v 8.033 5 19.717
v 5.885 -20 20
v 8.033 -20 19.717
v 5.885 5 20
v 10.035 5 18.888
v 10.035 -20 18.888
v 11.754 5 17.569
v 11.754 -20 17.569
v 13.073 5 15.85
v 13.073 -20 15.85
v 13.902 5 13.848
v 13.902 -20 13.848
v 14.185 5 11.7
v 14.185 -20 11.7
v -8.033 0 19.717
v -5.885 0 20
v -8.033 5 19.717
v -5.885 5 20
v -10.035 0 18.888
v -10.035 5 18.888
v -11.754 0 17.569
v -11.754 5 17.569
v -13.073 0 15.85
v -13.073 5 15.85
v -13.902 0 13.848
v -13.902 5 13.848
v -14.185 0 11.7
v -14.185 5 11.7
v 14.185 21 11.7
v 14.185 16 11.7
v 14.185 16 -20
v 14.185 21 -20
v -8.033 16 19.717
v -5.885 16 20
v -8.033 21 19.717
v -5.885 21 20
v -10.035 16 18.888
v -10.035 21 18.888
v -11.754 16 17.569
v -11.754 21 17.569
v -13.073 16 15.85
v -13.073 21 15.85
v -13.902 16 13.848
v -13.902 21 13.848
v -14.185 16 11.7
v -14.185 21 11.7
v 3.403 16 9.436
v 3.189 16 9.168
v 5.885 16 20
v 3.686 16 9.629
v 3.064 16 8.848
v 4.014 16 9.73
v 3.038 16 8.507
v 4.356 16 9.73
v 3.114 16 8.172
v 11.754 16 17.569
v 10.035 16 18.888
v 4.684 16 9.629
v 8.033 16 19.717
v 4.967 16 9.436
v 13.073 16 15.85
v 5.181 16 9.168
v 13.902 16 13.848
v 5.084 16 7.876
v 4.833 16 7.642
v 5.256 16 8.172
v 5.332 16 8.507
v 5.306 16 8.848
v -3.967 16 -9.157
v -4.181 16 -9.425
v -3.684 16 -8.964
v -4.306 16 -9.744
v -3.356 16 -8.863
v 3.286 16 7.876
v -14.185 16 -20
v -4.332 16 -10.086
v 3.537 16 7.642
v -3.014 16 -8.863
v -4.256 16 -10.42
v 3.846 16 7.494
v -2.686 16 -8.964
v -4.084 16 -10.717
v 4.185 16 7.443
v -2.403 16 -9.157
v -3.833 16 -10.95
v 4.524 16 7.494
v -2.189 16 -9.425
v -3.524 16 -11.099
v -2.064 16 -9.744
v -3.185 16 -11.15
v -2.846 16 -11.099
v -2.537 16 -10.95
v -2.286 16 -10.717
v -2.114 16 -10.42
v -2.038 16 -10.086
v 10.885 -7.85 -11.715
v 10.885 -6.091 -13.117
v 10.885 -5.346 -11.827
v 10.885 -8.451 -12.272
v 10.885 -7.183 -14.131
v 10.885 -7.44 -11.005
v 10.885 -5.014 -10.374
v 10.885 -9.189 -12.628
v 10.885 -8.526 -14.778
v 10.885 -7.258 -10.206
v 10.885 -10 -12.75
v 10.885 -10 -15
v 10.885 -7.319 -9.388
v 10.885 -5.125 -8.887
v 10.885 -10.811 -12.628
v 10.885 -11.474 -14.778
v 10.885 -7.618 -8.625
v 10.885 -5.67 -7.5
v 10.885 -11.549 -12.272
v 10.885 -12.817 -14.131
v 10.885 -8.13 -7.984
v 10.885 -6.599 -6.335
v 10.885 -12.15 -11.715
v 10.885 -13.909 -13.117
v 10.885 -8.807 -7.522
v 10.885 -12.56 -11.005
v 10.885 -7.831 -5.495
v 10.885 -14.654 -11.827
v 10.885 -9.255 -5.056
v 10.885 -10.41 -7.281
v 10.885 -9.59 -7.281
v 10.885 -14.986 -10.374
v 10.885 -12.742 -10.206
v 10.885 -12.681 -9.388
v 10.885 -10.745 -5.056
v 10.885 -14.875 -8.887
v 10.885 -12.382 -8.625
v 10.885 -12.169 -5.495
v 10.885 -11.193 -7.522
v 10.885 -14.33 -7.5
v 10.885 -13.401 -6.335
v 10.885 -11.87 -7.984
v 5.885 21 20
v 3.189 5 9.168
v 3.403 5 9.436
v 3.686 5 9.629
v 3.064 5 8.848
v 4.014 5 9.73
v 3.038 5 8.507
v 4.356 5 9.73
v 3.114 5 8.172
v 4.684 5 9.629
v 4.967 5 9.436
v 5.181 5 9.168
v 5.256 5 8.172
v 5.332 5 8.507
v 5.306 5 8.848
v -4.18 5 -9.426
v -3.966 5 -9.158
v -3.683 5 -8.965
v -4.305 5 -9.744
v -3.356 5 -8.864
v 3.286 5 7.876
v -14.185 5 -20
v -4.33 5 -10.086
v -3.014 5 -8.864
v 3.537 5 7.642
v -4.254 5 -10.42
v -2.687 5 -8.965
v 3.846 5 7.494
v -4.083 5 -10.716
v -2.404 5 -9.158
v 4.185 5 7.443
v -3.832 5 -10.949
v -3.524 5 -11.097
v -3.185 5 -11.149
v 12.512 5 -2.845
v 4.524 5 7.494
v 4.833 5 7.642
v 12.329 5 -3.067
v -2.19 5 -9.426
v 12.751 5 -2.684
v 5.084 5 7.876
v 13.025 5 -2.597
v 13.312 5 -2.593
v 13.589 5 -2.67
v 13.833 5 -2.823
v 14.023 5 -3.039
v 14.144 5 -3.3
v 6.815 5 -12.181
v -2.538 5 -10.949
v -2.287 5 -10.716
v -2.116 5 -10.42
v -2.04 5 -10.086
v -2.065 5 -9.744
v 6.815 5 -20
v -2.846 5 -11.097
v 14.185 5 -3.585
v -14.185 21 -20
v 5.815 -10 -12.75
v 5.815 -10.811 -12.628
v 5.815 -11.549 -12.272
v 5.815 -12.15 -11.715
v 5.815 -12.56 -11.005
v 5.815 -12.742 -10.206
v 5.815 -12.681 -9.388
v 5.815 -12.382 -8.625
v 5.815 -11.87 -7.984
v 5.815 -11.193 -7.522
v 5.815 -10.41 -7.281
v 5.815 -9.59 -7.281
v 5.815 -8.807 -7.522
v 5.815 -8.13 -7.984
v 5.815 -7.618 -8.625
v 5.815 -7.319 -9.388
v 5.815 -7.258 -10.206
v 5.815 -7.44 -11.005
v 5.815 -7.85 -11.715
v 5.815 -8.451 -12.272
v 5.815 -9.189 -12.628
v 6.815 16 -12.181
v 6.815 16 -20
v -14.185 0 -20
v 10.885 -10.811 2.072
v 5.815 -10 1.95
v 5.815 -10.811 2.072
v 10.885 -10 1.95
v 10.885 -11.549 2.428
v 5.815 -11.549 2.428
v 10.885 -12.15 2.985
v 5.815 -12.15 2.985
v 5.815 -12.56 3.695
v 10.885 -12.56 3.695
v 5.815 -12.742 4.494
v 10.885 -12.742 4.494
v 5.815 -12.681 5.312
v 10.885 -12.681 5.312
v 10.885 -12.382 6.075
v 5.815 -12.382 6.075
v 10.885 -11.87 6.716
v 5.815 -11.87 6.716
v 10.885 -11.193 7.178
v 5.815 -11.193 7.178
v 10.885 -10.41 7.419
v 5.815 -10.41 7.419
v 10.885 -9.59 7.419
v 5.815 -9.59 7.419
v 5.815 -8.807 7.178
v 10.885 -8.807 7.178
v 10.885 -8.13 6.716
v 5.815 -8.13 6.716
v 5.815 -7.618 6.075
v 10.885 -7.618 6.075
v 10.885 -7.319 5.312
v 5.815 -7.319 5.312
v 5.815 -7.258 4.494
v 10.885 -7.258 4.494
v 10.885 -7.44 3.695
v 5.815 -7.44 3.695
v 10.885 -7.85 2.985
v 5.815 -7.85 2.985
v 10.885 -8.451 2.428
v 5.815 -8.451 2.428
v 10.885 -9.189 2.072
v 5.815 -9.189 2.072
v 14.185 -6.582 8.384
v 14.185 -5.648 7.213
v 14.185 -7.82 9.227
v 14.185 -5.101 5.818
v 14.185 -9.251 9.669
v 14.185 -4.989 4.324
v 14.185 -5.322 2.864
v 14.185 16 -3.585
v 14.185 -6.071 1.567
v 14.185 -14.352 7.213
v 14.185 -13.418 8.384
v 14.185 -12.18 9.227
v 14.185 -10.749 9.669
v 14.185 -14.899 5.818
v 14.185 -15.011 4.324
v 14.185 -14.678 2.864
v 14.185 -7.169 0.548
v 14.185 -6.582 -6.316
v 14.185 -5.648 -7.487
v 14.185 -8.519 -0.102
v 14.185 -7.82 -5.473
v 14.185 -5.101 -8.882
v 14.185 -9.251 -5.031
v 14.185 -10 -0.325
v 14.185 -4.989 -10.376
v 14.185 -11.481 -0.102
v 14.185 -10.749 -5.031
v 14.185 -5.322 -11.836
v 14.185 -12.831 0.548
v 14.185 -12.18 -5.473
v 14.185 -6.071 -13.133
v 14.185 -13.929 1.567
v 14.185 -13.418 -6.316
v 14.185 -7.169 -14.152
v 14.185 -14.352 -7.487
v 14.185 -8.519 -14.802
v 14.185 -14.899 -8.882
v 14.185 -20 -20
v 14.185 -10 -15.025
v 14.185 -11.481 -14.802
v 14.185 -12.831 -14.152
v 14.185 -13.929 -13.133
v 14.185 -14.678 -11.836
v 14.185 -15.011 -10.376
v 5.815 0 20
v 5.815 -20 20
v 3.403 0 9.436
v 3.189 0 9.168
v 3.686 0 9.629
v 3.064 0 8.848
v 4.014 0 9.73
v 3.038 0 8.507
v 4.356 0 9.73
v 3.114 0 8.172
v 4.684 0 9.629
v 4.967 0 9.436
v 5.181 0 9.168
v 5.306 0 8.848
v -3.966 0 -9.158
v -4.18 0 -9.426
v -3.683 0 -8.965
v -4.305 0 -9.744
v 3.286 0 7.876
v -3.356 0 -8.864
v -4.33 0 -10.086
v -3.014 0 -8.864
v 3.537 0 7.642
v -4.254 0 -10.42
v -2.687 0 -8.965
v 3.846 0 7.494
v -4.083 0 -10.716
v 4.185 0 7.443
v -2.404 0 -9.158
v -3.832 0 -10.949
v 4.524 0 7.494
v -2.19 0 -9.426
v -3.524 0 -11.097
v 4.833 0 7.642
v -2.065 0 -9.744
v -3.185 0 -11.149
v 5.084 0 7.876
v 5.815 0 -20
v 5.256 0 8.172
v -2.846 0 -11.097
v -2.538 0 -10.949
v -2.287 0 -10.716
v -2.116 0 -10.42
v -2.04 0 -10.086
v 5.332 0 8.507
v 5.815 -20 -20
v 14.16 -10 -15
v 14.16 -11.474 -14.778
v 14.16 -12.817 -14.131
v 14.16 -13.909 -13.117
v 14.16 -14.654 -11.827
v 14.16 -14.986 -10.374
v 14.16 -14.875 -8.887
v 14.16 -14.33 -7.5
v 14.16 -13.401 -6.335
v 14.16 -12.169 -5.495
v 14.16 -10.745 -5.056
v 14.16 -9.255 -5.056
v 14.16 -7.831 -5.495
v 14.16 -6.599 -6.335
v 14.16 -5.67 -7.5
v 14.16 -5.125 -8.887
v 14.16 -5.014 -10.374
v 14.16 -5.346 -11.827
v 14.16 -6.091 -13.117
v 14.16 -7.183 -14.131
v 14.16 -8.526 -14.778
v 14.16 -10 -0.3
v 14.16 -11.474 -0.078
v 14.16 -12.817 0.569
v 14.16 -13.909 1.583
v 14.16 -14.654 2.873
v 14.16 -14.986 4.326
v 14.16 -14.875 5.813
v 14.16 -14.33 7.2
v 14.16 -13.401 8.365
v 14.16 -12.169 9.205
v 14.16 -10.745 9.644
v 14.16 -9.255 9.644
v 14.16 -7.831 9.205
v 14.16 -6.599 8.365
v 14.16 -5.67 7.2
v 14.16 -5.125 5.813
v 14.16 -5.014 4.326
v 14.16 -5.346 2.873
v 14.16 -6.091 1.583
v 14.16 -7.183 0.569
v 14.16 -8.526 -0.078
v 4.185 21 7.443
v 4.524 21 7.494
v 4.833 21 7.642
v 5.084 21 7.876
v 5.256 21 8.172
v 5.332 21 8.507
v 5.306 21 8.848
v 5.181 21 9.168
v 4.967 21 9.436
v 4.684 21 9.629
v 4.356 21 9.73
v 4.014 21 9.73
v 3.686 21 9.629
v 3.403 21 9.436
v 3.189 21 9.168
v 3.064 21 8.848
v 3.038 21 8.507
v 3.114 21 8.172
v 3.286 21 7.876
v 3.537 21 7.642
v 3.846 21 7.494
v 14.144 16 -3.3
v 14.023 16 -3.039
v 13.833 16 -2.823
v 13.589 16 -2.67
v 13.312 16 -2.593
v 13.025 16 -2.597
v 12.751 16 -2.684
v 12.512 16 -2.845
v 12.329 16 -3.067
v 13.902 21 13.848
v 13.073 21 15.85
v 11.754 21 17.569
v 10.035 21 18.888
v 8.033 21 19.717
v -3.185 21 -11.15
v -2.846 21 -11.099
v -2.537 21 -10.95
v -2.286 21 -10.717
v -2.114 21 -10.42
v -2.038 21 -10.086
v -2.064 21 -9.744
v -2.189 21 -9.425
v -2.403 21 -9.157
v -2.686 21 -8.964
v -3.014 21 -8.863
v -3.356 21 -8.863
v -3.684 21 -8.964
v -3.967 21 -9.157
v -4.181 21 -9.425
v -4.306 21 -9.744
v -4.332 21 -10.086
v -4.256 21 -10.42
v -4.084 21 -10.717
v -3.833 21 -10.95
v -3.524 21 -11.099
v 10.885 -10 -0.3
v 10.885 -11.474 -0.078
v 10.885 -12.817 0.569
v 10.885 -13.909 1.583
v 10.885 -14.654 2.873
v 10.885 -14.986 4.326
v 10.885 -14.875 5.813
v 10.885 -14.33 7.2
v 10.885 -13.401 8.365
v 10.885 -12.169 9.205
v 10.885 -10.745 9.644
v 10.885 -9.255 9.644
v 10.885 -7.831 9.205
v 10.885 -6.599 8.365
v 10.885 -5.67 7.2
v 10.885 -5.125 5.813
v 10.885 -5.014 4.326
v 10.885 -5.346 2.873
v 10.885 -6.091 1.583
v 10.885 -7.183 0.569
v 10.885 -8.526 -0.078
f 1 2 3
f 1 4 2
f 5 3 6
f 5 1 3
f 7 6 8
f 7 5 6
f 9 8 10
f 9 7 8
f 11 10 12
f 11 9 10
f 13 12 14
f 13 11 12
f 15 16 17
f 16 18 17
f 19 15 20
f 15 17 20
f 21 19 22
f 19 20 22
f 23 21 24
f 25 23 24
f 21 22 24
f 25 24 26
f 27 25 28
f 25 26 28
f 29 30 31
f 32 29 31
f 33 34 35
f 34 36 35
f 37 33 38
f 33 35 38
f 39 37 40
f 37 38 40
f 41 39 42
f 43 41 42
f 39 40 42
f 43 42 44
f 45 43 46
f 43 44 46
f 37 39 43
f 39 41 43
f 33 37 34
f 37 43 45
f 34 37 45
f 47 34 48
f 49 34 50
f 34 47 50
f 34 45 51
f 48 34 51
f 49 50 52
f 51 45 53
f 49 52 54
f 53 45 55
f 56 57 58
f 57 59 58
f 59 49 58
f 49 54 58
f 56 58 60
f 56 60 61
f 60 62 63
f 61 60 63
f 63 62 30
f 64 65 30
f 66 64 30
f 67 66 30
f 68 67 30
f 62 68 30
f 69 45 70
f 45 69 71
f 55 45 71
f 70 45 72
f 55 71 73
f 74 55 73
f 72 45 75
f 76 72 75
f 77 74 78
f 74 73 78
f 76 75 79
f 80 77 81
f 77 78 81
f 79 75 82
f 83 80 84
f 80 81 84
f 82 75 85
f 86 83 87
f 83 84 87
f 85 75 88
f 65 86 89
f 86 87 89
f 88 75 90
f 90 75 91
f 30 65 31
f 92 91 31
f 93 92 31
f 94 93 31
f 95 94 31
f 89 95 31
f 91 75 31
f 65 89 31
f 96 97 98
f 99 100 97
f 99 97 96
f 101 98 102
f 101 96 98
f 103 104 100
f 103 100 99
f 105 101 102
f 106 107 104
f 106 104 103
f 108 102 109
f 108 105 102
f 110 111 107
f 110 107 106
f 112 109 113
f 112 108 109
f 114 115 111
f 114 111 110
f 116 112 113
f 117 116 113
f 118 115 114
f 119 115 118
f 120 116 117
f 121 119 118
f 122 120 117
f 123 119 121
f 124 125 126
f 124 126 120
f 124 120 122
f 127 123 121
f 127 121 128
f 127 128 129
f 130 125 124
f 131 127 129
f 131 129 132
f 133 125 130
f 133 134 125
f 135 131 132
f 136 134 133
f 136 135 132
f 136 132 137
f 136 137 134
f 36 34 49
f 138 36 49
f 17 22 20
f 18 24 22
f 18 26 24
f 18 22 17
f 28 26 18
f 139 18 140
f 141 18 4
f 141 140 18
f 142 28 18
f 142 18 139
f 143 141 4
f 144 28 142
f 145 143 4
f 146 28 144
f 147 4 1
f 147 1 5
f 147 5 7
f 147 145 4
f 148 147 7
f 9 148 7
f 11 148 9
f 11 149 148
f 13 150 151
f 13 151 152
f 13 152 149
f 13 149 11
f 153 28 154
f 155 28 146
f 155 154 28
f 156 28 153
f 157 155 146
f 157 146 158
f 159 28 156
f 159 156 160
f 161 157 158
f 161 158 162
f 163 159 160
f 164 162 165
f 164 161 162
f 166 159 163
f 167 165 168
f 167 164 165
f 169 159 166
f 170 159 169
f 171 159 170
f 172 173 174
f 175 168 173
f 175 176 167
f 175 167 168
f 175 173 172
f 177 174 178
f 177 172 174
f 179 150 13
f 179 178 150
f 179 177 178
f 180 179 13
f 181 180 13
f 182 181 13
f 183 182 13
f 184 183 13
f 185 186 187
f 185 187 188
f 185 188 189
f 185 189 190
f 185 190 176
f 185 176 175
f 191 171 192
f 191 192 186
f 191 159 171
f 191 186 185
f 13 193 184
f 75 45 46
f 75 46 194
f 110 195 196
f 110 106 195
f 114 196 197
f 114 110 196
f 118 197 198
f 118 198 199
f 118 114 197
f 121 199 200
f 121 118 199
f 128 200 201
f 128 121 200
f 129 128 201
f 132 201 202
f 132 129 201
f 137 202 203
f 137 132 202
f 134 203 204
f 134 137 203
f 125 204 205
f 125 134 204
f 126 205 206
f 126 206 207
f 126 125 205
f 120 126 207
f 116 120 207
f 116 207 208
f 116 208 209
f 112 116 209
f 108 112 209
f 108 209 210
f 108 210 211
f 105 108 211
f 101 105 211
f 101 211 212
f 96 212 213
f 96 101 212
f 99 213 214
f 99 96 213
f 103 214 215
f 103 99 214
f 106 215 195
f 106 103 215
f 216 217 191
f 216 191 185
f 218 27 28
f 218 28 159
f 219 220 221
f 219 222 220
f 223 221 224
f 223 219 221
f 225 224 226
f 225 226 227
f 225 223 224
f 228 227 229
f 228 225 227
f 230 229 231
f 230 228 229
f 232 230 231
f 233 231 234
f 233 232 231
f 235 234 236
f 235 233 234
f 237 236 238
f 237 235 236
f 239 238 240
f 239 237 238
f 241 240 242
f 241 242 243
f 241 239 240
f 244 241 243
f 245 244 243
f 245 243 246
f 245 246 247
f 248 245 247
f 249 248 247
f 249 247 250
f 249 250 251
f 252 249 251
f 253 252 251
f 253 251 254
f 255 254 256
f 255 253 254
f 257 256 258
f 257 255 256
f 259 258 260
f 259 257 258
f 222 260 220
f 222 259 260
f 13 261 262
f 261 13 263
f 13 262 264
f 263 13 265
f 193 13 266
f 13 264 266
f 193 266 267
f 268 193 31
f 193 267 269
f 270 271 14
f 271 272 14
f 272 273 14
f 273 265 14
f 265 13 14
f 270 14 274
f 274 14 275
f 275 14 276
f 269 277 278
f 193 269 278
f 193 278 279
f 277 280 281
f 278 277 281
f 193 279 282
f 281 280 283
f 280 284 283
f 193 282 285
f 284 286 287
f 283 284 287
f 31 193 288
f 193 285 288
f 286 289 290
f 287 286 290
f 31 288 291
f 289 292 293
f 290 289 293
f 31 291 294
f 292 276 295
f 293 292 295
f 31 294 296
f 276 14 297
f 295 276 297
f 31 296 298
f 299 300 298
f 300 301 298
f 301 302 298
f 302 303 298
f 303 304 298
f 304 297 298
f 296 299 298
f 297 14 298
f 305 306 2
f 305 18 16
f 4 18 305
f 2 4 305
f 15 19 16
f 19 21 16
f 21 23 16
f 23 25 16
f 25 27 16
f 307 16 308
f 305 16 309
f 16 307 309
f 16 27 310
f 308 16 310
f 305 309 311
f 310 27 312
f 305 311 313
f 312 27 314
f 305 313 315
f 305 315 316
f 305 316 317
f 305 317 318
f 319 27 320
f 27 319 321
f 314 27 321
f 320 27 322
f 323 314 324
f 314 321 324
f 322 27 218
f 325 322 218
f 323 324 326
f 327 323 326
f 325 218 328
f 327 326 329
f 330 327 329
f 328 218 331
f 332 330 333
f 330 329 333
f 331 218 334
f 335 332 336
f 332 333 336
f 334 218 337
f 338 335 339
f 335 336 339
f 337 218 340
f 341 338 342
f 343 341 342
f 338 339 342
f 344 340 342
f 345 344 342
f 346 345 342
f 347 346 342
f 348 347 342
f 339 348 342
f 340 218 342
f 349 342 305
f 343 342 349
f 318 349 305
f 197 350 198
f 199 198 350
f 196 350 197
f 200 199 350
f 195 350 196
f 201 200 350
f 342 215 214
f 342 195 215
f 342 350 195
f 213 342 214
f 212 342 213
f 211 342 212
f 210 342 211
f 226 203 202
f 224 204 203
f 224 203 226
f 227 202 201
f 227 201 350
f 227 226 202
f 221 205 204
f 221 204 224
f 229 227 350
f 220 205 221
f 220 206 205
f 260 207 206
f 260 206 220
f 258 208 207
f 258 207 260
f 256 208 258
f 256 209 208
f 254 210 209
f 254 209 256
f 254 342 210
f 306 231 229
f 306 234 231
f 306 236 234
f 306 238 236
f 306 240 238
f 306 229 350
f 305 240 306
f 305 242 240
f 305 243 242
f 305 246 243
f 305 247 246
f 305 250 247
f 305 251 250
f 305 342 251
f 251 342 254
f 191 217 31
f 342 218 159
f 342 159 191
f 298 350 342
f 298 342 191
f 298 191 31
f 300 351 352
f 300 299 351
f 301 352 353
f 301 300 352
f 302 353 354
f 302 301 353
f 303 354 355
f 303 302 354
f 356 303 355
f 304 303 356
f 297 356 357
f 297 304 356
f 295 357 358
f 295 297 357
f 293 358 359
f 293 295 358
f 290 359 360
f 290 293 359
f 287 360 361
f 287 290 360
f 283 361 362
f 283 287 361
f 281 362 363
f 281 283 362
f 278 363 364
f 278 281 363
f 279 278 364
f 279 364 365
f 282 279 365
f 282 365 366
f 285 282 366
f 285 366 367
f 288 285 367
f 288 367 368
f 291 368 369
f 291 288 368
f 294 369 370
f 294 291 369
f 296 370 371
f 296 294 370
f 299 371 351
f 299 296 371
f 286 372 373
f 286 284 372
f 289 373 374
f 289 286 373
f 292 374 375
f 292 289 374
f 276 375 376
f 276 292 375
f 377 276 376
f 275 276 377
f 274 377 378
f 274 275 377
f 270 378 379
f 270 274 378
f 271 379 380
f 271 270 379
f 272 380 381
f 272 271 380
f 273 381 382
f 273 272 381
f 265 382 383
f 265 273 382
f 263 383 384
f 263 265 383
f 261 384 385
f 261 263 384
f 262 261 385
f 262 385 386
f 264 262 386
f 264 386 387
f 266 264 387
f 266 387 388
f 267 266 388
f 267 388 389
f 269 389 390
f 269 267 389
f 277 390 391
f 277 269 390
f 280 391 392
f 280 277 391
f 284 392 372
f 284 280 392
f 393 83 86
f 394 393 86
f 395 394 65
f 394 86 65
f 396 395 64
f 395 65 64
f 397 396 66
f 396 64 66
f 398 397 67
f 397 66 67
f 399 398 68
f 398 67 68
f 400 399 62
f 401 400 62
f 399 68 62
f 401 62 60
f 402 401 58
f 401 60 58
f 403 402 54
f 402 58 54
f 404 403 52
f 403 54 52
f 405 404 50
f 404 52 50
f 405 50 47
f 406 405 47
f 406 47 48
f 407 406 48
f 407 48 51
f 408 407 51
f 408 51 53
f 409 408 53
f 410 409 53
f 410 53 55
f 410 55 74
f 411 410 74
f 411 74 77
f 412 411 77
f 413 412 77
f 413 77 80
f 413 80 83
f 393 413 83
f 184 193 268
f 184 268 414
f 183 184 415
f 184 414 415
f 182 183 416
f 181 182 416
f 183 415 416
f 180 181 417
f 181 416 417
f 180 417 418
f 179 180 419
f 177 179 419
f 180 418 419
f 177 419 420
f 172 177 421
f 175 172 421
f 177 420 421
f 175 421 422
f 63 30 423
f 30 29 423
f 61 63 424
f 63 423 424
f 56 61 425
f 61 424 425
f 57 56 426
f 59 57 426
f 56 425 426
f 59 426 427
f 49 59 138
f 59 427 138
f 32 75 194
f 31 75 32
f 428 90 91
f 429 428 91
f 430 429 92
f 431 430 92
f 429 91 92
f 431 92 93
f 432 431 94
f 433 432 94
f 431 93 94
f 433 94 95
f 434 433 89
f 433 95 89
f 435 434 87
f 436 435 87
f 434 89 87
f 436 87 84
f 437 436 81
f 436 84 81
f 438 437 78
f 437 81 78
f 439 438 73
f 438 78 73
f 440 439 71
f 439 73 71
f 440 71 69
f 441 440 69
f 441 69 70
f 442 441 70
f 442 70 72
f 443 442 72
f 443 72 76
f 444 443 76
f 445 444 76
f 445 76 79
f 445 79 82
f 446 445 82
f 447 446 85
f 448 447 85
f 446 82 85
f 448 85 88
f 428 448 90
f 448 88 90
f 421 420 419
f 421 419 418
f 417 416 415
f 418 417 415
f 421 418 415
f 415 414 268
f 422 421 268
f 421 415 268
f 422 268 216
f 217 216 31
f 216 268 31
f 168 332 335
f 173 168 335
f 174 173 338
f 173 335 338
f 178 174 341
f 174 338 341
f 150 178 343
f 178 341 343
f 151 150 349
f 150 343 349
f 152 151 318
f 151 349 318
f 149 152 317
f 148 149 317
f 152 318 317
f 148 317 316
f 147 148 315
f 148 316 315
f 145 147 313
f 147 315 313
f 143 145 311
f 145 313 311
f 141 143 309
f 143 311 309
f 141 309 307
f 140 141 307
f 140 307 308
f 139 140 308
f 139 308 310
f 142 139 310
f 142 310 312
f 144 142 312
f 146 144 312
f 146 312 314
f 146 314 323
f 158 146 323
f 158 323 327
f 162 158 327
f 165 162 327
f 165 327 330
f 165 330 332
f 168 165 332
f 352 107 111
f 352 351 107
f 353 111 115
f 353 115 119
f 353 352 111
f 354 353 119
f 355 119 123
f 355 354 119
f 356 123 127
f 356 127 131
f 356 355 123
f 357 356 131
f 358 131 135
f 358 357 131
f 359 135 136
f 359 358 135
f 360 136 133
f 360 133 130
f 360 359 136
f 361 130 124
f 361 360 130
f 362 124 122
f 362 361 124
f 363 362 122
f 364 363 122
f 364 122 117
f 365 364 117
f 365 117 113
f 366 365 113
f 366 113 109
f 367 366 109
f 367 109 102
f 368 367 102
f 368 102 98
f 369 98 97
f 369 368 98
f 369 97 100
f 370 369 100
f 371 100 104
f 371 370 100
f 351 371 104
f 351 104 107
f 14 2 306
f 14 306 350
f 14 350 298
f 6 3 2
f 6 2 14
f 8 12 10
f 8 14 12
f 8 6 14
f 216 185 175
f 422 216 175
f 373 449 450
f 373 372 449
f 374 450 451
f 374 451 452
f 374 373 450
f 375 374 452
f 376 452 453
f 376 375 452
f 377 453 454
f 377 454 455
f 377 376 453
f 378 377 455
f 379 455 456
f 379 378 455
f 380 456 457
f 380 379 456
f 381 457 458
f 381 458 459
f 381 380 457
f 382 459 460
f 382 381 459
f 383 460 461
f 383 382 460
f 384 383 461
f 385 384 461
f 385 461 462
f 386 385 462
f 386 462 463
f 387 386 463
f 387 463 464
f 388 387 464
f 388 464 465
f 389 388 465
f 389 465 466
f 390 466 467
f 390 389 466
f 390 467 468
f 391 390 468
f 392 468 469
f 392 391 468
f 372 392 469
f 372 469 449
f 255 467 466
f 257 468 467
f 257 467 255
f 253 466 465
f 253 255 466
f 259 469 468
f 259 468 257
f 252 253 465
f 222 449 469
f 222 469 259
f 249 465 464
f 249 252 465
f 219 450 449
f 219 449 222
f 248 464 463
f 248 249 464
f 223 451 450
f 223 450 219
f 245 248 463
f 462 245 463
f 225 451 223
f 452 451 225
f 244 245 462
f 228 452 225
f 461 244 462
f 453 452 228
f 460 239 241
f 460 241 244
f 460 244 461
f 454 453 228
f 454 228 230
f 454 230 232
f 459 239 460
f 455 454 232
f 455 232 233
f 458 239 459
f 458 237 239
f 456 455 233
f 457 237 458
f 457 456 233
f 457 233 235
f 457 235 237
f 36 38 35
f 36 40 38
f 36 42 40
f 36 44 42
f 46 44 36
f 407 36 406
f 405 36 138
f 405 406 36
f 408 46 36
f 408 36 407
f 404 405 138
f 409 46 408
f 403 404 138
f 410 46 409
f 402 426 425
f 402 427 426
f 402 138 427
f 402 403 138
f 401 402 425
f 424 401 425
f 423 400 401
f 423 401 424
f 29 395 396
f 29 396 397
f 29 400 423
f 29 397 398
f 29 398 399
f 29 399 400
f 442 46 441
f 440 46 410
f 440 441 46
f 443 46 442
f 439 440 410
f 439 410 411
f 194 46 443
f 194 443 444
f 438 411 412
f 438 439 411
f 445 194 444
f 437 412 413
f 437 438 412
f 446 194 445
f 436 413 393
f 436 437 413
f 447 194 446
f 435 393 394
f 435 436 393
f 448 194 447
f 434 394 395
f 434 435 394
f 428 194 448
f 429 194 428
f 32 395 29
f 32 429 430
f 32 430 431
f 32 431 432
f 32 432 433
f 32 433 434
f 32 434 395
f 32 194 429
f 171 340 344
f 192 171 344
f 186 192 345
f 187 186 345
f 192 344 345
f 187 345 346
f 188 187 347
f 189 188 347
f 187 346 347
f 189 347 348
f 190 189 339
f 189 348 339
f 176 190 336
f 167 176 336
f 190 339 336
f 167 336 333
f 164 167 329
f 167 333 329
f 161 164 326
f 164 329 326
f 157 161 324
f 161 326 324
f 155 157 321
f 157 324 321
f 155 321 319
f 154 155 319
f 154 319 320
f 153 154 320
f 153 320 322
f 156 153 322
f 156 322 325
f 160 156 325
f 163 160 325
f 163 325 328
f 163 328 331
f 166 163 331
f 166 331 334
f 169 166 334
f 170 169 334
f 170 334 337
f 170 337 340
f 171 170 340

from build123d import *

# Parameters (mm, degrees)
SKETCH1_W                                  = 28.37
SKETCH1_H                                  = 40
BOSS_EXTRUDE1_DEPTH                        = 5
SKETCH2_R                                  = 1.148523169
CUT_EXTRUDE1_DEPTH                         = 26.024272717
SKETCH4_W                                  = 8.37
SKETCH4_H                                  = 40
BOSS_EXTRUDE2_DEPTH                        = 20
BOSS_EXTRUDE3_DEPTH                        = 11
SKETCH6_W                                  = 28.37
SKETCH6_H                                  = 40
BOSS_EXTRUDE4_DEPTH                        = 5
SKETCH3_R                                  = 1.15
CUT_EXTRUDE2_DEPTH                         = 33.283342841
SKETCH7_R                                  = 1.15
CUT_EXTRUDE3_DEPTH                         = 5
FILLET1_R                                  = 1
FILLET2_R                                  = 8.3
CBORE_FOR_M5_CHEESE_HEAD_SCREW1_AT_2_COUNT = 2
CBORE_FOR_M5_CHEESE_HEAD_SCREW1_AT_2_PITCH = 14.7


with BuildPart() as part:
    # Sketch1 → Boss-Extrude1 (new body)
    with BuildSketch(Plane(origin=(0, 0, 0), x_dir=(1, 0, 0), z_dir=(0, 1, 0))):
        Rectangle(SKETCH1_W, SKETCH1_H)
    extrude(amount=BOSS_EXTRUDE1_DEPTH)

    # Sketch2 → Cut-Extrude1 (cut, through all)
    with BuildSketch(Plane.XZ):
        with Locations(Location((-3.185, -10, 0), (0, 0, 270))):
            Circle(SKETCH2_R)
    extrude(amount=-CUT_EXTRUDE1_DEPTH, mode=Mode.SUBTRACT)

    # Sketch4 → Boss-Extrude2 (add)
    with BuildSketch(Plane.XZ):
        with Locations((10, 0)):
            Rectangle(SKETCH4_W, SKETCH4_H)
    extrude(amount=BOSS_EXTRUDE2_DEPTH)

    # Sketch5 → Boss-Extrude3 (add)
    with BuildSketch(Plane(origin=(0, 5, 0), x_dir=(1, 0, 0), z_dir=(0, 1, 0))):
        Polygon((14.185, 20), (6.815, 20), (6.815, 12.181164673), (14.185, 0), align=None)
    extrude(amount=BOSS_EXTRUDE3_DEPTH)

    # Sketch6 → Boss-Extrude4 (add)
    with BuildSketch(Plane(origin=(0, 16, 0), x_dir=(1, 0, 0), z_dir=(0, 1, 0))):
        Rectangle(SKETCH6_W, SKETCH6_H)
    extrude(amount=BOSS_EXTRUDE4_DEPTH)

    # Sketch3 → Cut-Extrude2 (cut, through all)
    with BuildSketch(Plane.XZ):
        with Locations(Location((4.185, 8.592554962, 0), (0, 0, 270))):
            Circle(SKETCH3_R)
    extrude(amount=-CUT_EXTRUDE2_DEPTH, mode=Mode.SUBTRACT)

    # Sketch7 → Cut-Extrude3 (cut)
    with BuildSketch(Plane.XZ.offset(-16)):
        with Locations(Location((-3.185, -10, 0), (0, 0, 270))):
            Circle(SKETCH7_R)
        with Locations(Location((4.185, 8.592554962, 0), (0, 0, 270))):
            Circle(SKETCH7_R)
    extrude(amount=-CUT_EXTRUDE3_DEPTH, mode=Mode.SUBTRACT)

    # Fillet1
    fillet1_edges = [part.edges().sort_by_distance(p)[0] for p in [
        (14.185, 10.5, 0),
    ]]
    fillet(fillet1_edges, radius=FILLET1_R)

    # Fillet2
    fillet2_edges = [part.edges().sort_by_distance(p)[0] for p in [
        (14.185, 18.5, 20),
        (-14.185, 18.5, 20),
        (14.185, -7.5, 20),
        (-14.185, 2.5, 20),
    ]]
    fillet(fillet2_edges, radius=FILLET2_R)


with BuildPart() as body_2:
    # Split1: the piece on the far side of the plane
    add(part.part)
    split(bisect_by=Plane(origin=(0, 16, 0), x_dir=(0, 0, -1), z_dir=(0, -1, 0)), keep=Keep.BOTTOM)


with BuildPart() as part_1:
    add(part.part)

    # Split1
    split(bisect_by=Plane(origin=(0, 16, 0), x_dir=(0, 0, -1), z_dir=(0, -1, 0)), keep=Keep.TOP)

    # Sketch10 → CBORE for M5 Cheese Head Screw1 (revolve, cut)
    with BuildSketch(Plane(origin=(14.185, -10, 4.7), x_dir=(0, 0, -1), z_dir=(0, 1, 0))):
        Polygon((0, 0), (0, 8.37), (2.75, 8.37), (2.75, 3.3), (5, 3.3), (5, 0.025), (5.025, 0), align=None)
    cbore_for_m5_cheese_head_screw1 = revolve(axis=Axis((20.535, -10, 4.7), (-1, 0, 0)), mode=Mode.SUBTRACT)

    # CBORE for M5 Cheese Head Screw1 at 2: CBORE for M5 Cheese Head Screw1 ×2
    with Locations(*[(0, 0, -i * CBORE_FOR_M5_CHEESE_HEAD_SCREW1_AT_2_PITCH) for i in range(1, CBORE_FOR_M5_CHEESE_HEAD_SCREW1_AT_2_COUNT)]):
        add(cbore_for_m5_cheese_head_screw1, mode=Mode.SUBTRACT)


solid = Compound([body_2.part, part_1.part])
